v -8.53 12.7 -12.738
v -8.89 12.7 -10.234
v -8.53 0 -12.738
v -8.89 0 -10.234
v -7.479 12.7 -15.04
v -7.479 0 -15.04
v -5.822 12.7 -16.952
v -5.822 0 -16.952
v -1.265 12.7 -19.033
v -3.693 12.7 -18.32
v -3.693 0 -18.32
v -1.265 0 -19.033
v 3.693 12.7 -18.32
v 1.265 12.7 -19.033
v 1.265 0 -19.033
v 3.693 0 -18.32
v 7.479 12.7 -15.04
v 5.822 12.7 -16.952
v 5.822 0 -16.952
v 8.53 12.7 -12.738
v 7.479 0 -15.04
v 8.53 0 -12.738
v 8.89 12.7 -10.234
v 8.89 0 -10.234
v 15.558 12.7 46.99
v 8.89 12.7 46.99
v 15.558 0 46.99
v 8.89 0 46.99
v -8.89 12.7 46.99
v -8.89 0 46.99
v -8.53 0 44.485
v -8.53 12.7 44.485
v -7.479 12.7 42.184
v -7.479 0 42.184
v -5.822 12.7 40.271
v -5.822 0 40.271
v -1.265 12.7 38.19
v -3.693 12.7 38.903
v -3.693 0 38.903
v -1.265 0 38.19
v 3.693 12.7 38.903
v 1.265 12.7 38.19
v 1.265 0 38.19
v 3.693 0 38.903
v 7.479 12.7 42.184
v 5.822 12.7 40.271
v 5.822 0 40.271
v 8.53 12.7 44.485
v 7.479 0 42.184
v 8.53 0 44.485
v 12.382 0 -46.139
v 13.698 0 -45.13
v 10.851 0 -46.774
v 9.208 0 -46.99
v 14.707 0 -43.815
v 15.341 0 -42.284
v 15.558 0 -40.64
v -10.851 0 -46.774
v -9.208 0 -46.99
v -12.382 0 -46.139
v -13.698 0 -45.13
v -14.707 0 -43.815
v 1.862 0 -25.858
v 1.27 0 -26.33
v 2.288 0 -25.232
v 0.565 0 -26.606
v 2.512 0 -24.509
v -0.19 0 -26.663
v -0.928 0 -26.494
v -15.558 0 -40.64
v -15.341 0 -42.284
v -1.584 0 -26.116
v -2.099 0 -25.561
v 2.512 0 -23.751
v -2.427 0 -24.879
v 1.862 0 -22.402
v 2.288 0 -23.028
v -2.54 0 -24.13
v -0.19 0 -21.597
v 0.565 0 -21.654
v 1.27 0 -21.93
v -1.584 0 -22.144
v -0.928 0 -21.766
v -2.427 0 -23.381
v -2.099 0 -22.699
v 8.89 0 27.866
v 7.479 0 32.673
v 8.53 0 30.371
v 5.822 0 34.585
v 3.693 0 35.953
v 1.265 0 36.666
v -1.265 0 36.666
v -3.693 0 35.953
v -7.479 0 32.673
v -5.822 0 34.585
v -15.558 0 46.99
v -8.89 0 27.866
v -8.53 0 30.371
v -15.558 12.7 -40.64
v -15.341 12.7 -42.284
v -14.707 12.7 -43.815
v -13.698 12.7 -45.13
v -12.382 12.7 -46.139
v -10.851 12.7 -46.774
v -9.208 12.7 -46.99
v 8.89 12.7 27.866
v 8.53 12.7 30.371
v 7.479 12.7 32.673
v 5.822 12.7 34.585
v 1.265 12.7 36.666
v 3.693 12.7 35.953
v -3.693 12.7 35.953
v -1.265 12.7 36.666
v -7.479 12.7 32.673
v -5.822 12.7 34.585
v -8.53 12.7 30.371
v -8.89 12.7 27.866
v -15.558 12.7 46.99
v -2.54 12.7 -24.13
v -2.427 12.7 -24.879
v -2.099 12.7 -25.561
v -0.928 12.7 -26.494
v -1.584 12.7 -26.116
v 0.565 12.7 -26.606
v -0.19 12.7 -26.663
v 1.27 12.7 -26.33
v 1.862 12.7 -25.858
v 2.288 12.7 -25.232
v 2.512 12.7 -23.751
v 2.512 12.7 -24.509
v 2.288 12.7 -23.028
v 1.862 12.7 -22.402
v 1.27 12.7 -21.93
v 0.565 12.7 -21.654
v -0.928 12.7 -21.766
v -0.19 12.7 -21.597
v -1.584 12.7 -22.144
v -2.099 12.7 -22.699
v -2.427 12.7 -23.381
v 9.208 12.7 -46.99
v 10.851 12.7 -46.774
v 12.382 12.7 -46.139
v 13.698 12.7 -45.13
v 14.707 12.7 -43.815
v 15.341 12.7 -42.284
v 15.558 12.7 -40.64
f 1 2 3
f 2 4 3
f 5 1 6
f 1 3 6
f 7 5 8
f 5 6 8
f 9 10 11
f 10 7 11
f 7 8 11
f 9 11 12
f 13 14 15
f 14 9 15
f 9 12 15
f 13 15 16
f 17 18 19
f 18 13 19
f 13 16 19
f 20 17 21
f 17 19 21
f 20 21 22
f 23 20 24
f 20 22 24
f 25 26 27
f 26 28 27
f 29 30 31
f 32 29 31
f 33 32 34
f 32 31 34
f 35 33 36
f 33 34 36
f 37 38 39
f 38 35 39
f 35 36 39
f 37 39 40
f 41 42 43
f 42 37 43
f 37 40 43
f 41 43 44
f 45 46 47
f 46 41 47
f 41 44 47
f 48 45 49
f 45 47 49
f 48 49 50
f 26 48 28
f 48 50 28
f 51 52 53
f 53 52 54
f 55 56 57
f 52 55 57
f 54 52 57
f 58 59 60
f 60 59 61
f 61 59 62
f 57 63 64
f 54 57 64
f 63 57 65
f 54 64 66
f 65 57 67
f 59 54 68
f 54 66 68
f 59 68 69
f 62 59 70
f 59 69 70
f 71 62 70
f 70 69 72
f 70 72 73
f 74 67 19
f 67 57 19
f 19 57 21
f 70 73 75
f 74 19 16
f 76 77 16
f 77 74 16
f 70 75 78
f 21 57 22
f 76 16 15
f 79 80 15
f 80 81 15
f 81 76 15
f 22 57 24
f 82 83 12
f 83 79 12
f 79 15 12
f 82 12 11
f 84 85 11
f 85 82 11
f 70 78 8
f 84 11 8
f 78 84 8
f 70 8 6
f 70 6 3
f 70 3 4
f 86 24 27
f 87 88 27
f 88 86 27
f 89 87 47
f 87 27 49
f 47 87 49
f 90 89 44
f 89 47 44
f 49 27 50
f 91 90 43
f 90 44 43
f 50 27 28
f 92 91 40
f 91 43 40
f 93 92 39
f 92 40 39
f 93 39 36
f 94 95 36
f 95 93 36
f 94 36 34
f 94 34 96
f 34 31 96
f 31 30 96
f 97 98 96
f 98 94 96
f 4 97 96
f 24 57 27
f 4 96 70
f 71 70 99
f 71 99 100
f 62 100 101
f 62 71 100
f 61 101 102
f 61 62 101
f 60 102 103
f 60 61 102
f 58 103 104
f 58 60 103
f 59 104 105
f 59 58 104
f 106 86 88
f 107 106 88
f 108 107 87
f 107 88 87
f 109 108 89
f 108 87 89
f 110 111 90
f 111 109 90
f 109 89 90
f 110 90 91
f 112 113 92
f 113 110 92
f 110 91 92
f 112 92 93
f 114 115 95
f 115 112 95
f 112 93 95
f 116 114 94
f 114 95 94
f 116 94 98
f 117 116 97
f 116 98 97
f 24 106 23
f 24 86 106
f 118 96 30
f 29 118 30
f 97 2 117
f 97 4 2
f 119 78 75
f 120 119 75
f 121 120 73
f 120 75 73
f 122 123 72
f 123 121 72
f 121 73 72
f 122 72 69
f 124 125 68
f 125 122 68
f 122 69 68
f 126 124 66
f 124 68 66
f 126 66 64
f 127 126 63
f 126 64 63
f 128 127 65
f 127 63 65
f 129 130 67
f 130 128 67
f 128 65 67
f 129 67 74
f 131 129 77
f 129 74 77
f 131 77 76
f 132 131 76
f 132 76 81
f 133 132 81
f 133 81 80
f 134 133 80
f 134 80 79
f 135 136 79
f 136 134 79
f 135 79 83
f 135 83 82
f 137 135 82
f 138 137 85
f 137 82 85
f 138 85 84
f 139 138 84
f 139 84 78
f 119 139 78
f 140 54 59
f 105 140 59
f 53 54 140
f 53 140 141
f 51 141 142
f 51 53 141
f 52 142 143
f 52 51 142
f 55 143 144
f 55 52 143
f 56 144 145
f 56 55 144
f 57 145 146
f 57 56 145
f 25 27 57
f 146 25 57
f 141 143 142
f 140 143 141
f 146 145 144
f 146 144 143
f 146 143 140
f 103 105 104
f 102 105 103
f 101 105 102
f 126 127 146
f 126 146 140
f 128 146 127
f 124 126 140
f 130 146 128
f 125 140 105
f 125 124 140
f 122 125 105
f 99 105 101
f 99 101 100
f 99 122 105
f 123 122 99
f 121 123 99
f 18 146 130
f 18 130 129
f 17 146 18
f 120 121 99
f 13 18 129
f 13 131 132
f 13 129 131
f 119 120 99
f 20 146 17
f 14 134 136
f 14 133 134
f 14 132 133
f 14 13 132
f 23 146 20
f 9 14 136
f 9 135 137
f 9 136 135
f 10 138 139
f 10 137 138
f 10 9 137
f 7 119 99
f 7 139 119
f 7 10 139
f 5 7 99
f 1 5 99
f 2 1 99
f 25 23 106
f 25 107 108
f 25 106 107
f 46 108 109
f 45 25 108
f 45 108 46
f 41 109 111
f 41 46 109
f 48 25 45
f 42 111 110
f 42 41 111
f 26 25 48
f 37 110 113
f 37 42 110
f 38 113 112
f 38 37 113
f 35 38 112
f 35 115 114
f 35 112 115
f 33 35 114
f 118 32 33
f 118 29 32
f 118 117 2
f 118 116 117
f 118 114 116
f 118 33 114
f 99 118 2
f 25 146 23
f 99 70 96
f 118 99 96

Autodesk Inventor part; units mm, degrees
ref_plane "YZ Plane" through (0, 0, 0) normal (1, 0, 0) x (0, 1, 0)
ref_plane "XZ Plane" through (0, 0, 0) normal (0, 1, 0) x (-1, 0, 0)
ref_plane "XY Plane" through (0, 0, 0) normal (0, 0, 1) x (1, 0, 0)
sketch "Sketch1" plane through (0, 0, 0) normal (0, 1, 0) x (-1, 0, 0)
  line L0 (-9.2075, -46.99) -> (9.2075, -46.99)
  line L1 (15.5575, -40.64) -> (15.5575, 46.99)
  line L2 (-15.5575, 46.99) -> (-15.5575, -40.64)
  line L3 (-15.5575, -46.99) -> (15.5575, 46.99) construction
  line L4 (15.5575, -46.99) -> (-15.5575, 46.99) construction
  circle A0 centre (0, -24.13) radius 2.54
  line L5 (8.89, -10.2337) -> (8.89, 27.8663)
  line L6 (-8.89, 27.8663) -> (-8.89, -10.2337)
  line L7 (-8.89, -10.2337) -> (8.89, 27.8663) construction
  line L8 (8.89, -10.2337) -> (-8.89, 27.8663) construction
  arc A1 (8.89, 27.8663) -> (-8.89, 27.8663) centre (0, 27.8663) ccw
  arc A2 (-8.89, -10.2337) -> (8.89, -10.2337) centre (0, -10.2337) ccw
  arc A3 (-8.89, 46.99) -> (8.89, 46.99) centre (0, 46.99) ccw
  line L9 (15.5575, 46.99) -> (8.89, 46.99)
  line L10 (-8.89, 46.99) -> (-15.5575, 46.99)
  arc A4 (9.2075, -46.99) -> (15.5575, -40.64) centre (9.2075, -40.64) ccw
  arc A5 (-15.5575, -40.64) -> (-9.2075, -46.99) centre (-9.2075, -40.64) ccw
  point P0 (0, 0)
  point P1 (0, 8.8163)
  dimension "d0" = 93.98
  dimension "d1" = 31.115
  dimension "d2" = 22.86
  dimension "d3" = 5.08
  dimension "d4" = 38.1
  dimension "d5" = 17.78
  dimension "d6" = 17.78
  dimension "d7" = 6.35
extrude "Extrusion1" add sketch "Sketch1" along normal blind 12.7
equation "\"d6\" = d5"
properties part number "Fixture_Slide_Lock_Plate"
